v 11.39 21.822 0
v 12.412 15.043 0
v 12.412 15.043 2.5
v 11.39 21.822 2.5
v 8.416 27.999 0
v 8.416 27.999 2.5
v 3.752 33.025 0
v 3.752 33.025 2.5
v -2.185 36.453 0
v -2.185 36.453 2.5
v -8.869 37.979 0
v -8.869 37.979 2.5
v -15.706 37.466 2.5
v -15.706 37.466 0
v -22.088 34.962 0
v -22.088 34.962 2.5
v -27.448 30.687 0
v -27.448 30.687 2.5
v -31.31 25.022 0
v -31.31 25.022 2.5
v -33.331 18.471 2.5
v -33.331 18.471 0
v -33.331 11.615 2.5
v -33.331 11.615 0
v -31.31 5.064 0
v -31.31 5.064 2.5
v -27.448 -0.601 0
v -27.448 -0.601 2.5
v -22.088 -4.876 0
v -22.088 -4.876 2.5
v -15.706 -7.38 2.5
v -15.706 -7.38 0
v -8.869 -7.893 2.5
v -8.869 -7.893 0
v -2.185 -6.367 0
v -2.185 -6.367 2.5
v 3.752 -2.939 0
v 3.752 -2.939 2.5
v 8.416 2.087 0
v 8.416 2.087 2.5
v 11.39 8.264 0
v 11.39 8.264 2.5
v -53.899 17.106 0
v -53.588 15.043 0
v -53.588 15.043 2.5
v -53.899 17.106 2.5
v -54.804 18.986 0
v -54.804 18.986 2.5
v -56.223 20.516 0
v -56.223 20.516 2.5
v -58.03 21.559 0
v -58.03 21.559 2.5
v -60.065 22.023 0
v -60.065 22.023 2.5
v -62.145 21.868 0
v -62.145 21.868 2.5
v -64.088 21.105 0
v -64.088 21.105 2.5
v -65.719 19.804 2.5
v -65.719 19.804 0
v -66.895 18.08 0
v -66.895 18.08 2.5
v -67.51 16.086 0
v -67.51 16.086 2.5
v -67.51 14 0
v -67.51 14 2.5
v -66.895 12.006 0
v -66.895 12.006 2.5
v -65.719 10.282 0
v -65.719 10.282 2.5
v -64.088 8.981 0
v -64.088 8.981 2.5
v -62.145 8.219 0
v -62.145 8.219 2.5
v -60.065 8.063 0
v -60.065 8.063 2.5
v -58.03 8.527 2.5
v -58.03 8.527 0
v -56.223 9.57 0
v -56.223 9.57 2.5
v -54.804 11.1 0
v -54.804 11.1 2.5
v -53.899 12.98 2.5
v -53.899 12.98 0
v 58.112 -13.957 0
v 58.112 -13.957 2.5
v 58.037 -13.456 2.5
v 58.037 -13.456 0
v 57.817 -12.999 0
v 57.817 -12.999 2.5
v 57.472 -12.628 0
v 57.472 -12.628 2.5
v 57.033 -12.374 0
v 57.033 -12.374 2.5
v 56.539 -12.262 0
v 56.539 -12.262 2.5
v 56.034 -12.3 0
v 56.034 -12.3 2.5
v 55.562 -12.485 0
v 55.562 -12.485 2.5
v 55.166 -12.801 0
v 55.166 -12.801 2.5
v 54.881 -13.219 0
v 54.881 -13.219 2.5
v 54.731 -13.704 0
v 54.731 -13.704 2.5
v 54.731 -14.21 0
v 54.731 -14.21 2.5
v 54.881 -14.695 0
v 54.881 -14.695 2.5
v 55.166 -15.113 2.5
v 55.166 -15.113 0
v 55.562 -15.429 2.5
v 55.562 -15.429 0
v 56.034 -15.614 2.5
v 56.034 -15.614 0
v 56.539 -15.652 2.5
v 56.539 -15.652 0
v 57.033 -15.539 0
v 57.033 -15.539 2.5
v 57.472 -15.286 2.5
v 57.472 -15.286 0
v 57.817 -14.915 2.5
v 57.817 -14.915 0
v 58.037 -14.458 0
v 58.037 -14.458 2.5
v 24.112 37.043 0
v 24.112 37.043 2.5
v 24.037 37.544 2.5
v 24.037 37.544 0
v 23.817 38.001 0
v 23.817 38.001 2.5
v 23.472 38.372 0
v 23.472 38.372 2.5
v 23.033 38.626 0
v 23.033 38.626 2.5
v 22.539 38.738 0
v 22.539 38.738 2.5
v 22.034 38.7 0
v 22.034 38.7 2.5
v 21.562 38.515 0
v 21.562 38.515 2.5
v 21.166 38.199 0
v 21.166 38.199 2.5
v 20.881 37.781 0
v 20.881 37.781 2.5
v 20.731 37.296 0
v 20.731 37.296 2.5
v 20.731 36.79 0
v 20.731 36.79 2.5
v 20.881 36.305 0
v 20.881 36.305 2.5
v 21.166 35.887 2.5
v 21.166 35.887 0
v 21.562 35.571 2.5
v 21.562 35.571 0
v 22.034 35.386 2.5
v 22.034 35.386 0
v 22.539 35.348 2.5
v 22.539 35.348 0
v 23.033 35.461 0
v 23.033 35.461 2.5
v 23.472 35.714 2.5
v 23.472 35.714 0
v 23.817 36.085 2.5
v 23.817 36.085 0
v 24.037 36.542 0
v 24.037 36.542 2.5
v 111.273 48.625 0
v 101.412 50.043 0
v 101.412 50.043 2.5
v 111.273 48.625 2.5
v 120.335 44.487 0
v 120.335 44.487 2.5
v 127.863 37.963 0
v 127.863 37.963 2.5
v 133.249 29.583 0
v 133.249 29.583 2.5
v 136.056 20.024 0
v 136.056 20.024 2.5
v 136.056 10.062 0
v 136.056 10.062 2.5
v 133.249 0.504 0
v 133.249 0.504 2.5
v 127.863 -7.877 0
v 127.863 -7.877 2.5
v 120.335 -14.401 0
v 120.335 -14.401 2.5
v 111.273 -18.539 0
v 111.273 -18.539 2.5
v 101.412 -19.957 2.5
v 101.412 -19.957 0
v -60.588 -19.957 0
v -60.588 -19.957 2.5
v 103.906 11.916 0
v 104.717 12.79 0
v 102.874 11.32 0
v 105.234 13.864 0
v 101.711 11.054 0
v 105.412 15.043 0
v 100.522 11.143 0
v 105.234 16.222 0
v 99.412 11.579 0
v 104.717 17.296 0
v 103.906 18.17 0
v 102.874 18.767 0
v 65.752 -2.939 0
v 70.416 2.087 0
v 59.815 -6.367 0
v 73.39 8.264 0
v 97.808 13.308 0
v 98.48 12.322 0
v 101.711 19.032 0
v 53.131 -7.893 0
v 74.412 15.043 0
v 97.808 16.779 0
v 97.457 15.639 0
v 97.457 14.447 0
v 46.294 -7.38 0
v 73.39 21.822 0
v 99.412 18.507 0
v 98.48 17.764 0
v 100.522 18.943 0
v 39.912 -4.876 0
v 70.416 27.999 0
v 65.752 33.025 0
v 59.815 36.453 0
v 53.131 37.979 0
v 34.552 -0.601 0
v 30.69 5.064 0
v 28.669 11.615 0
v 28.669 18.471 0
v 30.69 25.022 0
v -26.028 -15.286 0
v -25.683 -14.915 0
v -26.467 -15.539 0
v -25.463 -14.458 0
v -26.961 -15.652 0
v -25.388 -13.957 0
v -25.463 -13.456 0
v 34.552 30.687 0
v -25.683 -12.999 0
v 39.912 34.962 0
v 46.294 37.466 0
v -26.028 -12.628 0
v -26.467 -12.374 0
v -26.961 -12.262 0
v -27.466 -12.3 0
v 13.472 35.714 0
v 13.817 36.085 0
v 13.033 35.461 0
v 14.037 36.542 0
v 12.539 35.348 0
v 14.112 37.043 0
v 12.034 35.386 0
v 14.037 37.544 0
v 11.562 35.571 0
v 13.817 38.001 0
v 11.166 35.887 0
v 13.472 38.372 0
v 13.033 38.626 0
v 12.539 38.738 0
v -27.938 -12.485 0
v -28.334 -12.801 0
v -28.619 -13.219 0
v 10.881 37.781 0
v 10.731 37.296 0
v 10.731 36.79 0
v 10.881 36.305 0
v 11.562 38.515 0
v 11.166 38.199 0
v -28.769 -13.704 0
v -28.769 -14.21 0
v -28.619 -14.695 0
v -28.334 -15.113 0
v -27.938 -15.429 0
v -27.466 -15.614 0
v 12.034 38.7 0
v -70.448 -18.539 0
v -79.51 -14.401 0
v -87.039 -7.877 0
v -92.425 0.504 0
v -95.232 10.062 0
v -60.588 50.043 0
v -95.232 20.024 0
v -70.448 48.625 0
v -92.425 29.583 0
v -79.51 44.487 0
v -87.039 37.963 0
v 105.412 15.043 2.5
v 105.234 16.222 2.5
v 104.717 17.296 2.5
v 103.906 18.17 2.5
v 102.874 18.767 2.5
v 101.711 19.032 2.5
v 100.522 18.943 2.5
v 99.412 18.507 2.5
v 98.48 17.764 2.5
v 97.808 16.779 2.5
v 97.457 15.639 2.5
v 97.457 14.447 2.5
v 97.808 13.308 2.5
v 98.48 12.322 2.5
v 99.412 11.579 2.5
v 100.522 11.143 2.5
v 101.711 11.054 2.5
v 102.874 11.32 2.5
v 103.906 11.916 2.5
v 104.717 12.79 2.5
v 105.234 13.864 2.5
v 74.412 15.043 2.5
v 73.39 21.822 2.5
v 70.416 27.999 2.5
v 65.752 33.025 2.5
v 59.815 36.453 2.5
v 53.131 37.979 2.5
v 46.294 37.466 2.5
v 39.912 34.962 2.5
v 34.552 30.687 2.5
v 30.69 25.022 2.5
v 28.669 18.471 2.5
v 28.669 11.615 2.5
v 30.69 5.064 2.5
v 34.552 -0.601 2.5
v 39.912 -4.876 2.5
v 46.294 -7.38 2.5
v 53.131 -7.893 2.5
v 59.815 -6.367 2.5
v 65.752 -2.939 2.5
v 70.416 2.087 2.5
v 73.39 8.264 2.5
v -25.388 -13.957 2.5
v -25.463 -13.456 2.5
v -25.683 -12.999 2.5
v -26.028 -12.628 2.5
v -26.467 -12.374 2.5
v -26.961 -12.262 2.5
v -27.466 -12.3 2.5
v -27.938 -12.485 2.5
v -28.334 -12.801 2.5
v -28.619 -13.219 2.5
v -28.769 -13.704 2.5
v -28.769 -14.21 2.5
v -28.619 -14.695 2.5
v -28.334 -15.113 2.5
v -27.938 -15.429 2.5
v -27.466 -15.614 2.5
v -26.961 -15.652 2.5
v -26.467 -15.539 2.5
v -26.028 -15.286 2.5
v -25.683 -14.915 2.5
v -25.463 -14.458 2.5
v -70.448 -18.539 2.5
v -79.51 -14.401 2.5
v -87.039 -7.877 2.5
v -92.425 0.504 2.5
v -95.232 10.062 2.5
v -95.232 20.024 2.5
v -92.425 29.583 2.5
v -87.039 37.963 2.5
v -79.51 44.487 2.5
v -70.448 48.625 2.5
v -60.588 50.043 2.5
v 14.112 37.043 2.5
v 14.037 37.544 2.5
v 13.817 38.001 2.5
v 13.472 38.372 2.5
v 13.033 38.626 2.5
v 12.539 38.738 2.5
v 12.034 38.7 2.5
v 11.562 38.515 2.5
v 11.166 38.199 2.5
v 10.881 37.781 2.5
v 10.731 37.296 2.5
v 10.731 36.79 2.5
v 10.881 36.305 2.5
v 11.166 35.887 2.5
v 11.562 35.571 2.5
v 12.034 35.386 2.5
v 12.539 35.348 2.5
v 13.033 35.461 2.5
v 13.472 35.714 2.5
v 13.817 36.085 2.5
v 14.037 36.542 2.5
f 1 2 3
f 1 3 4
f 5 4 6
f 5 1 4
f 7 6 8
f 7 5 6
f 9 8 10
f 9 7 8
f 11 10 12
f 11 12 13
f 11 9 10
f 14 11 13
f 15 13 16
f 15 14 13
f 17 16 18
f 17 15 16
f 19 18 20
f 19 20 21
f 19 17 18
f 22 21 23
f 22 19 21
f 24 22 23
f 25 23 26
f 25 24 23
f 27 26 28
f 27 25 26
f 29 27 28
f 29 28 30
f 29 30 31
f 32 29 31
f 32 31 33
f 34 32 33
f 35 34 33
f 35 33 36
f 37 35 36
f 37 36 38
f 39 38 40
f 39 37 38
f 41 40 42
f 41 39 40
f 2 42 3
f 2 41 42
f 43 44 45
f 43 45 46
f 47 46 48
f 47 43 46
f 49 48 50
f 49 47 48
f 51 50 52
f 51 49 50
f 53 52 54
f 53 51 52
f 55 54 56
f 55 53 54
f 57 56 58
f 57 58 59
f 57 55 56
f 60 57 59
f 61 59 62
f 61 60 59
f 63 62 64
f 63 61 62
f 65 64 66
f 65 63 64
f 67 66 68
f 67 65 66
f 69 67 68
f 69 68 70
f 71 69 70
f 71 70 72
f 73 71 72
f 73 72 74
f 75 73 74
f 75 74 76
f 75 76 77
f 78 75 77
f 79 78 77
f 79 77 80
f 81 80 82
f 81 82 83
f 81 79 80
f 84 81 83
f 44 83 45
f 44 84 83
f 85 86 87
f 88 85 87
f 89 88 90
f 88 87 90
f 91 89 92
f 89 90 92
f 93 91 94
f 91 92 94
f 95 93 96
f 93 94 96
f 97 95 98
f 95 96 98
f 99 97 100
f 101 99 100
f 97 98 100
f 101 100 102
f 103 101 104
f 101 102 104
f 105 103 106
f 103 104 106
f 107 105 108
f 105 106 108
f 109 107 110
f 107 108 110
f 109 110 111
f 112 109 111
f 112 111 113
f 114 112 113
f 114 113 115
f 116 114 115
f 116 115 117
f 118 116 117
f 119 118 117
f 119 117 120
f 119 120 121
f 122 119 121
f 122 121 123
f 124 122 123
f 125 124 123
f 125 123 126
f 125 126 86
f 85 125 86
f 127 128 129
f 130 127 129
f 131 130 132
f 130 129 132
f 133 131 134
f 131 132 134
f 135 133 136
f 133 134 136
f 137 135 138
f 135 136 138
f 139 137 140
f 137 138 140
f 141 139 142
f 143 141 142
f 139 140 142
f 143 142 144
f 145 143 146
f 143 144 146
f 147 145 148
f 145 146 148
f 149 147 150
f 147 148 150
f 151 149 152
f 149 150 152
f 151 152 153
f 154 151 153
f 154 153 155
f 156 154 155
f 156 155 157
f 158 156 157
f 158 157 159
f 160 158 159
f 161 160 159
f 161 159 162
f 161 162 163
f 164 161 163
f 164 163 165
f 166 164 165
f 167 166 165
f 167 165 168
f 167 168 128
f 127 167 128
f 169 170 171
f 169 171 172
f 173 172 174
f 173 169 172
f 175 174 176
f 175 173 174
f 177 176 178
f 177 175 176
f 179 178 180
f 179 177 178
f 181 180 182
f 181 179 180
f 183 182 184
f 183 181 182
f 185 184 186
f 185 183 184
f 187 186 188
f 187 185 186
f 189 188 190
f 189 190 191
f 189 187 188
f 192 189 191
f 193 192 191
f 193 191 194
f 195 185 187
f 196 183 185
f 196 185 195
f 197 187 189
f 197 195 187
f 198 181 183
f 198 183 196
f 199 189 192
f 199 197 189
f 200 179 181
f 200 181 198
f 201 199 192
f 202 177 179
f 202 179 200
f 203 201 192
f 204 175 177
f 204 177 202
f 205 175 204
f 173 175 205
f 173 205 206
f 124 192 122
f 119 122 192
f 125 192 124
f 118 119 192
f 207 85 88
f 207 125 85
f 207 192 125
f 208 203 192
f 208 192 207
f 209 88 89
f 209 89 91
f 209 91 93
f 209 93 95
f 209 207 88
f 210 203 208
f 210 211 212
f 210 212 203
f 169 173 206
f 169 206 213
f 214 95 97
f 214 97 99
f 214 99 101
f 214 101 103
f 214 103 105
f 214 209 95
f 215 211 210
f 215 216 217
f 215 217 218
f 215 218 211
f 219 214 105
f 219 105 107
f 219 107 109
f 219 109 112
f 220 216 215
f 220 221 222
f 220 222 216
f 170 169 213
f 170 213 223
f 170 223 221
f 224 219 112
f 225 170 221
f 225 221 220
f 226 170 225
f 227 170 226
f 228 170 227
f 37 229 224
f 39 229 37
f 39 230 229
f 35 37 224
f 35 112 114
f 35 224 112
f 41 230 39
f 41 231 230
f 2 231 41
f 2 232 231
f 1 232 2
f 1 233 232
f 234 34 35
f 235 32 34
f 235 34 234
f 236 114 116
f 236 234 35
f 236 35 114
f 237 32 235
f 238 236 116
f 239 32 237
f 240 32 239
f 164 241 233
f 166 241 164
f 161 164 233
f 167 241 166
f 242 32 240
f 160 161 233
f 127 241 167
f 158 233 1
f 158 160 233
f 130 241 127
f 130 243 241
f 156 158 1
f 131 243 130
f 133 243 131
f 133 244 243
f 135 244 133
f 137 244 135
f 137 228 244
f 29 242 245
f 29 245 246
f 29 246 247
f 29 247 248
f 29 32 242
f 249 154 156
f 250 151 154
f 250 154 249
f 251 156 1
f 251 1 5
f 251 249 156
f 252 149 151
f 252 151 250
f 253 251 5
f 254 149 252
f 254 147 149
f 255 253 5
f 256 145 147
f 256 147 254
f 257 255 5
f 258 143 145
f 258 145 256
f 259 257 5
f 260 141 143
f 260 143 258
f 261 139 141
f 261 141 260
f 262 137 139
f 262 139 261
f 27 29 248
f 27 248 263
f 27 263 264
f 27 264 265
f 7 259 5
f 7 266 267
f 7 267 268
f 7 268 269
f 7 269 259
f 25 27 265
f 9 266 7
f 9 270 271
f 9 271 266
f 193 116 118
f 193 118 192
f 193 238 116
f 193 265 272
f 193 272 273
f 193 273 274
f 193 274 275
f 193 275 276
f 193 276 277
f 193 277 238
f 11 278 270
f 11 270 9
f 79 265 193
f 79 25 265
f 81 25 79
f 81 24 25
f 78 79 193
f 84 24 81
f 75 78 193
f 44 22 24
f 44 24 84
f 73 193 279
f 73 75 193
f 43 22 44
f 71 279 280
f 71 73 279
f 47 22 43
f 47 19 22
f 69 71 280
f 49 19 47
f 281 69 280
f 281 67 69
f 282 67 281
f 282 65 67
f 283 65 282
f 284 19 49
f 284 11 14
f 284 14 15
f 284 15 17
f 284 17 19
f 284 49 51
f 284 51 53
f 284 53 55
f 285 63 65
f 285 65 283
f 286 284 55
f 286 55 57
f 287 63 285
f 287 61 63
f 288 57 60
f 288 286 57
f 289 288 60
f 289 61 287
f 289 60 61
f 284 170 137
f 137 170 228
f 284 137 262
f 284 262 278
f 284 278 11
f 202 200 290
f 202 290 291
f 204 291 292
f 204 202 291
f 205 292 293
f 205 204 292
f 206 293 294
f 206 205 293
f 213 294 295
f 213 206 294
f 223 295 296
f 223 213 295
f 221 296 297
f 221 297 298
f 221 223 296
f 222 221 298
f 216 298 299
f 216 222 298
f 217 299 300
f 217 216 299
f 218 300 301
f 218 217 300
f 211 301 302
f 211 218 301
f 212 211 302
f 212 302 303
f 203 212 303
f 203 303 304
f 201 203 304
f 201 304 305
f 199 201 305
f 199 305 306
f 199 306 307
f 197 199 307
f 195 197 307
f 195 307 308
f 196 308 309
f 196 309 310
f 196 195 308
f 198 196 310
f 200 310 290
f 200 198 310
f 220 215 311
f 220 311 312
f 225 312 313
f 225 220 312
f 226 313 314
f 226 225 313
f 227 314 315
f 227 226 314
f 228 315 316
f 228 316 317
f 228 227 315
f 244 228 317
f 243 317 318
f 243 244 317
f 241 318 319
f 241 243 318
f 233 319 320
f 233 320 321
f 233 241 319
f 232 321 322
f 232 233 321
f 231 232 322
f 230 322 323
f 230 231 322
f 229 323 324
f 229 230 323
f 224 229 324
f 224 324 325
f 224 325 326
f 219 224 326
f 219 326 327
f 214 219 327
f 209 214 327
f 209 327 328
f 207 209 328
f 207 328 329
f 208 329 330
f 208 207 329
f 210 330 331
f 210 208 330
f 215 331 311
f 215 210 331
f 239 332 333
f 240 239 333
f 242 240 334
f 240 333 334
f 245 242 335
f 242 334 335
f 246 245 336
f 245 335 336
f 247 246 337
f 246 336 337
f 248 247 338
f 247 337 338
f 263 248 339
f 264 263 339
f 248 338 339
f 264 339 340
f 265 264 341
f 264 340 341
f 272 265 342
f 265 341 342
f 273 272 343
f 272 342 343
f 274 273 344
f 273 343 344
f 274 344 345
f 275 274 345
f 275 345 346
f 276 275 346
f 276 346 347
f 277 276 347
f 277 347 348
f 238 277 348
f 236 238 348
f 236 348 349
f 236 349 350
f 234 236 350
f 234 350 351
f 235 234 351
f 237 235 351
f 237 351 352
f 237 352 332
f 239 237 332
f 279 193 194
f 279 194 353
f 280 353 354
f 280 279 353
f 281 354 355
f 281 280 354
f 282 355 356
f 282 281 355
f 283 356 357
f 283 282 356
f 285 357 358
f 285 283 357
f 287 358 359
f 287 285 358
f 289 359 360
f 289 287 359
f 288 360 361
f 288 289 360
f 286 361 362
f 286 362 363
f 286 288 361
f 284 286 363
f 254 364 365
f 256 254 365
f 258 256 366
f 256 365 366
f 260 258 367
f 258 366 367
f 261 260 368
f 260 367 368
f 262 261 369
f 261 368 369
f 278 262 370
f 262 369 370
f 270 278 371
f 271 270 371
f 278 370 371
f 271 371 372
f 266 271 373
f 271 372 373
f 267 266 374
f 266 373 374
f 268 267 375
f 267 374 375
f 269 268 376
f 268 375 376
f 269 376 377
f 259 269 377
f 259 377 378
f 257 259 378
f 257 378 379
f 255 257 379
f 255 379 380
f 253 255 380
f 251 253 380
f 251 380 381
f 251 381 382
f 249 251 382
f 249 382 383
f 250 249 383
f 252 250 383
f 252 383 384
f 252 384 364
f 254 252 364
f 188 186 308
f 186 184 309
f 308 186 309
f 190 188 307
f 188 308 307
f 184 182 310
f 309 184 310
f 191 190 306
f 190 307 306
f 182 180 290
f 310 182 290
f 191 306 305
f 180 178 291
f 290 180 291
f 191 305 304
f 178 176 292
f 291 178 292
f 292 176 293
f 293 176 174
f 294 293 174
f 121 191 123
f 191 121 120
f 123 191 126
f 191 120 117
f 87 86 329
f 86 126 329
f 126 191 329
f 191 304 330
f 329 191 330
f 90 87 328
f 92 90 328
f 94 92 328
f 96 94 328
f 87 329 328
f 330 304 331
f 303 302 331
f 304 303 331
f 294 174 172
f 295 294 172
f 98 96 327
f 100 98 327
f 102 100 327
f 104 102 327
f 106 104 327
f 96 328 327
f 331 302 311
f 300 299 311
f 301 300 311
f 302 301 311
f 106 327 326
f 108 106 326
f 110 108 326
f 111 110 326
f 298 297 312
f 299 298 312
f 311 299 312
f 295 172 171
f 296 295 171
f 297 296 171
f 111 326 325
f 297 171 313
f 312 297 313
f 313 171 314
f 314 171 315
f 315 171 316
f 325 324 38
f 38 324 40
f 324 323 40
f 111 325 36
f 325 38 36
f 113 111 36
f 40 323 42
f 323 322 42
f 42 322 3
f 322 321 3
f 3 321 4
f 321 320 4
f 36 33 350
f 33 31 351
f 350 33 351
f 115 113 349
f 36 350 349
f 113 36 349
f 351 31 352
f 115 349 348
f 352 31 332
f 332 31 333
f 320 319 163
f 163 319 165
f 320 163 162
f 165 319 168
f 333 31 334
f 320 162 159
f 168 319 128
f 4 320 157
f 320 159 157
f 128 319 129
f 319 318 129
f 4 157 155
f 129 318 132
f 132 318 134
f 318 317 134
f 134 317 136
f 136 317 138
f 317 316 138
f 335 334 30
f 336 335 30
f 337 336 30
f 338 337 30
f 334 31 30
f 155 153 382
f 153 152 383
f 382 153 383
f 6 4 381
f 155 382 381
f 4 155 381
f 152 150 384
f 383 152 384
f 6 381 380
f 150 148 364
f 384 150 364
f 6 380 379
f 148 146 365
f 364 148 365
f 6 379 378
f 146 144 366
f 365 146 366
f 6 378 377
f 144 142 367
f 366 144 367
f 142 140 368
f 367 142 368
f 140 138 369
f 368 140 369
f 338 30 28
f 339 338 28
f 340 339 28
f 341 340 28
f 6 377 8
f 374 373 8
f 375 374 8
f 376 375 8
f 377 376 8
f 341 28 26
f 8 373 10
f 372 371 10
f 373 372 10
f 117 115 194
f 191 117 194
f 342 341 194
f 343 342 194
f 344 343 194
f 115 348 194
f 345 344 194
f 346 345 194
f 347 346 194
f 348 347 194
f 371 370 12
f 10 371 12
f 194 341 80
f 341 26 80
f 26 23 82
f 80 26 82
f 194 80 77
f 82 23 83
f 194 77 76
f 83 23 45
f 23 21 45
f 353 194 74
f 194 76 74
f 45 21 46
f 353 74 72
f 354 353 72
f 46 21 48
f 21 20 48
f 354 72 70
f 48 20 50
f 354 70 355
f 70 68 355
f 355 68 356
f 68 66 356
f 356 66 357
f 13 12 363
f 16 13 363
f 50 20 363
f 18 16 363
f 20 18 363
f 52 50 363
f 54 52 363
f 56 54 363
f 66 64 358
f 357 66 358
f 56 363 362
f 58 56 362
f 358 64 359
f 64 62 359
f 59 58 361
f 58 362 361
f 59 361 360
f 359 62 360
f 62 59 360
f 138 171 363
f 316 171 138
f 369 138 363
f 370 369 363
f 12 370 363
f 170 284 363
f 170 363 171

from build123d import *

# Parameters (mm, degrees)
ESQUISSE2_R                = 7
ESQUISSE2_R_2              = 4
ESQUISSE2_R_3              = 23
BASE_EXTRUSION_DEPTH       = 2.5
ESQUISSE9_R                = 1.7
ENL_V_MAT_EXTRU_2_DEPTH    = 146.323213238
R_P_TITION_LIN_AIRE1_COUNT = 2
R_P_TITION_LIN_AIRE1_PITCH = 10
ESQUISSE10_R               = 1.7
ENL_V_MAT_EXTRU_3_DEPTH    = 146.323213238
R_P_TITION_LIN_AIRE2_COUNT = 2
R_P_TITION_LIN_AIRE2_PITCH = 83.5


with BuildPart() as part:
    # Esquisse2 → Base-Extrusion (new body)
    with BuildSketch(Plane.XY):
        with BuildLine():
            Line((-60.587831126, 50.043046358), (101.412168874, 50.043046358))
            ThreePointArc((101.412168874, 50.043046358), (136.412168874, 15.043046358), (101.412168874, -19.956953642))
            Line((101.412168874, -19.956953642), (-60.587831126, -19.956953642))
            ThreePointArc((-60.587831126, -19.956953642), (-95.587831126, 15.043046358), (-60.587831126, 50.043046358))
        make_face()
        with Locations((-60.587831126, 15.043046358)):
            Circle(ESQUISSE2_R, mode=Mode.SUBTRACT)
        with Locations((101.412168874, 15.043046358)):
            Circle(ESQUISSE2_R_2, mode=Mode.SUBTRACT)
        with Locations((51.412168874, 15.043046358)):
            Circle(ESQUISSE2_R_3, mode=Mode.SUBTRACT)
        with Locations((-10.587831126, 15.043046358)):
            Circle(ESQUISSE2_R_3, mode=Mode.SUBTRACT)
    extrude(amount=BASE_EXTRUSION_DEPTH)

    # Esquisse9 → Enlèv. mat.-Extru.2 (cut, through all)
    with BuildSketch(Plane.XY.offset(2.5)):
        with Locations((12.412168874, 37.043046358)):
            Circle(ESQUISSE9_R)
    enl_v_mat_extru_2 = extrude(amount=-ENL_V_MAT_EXTRU_2_DEPTH, mode=Mode.SUBTRACT)

    # Répétition linéaire1: Enlèv. mat.-Extru.2 ×2
    with Locations(*[(i * R_P_TITION_LIN_AIRE1_PITCH, 0, 0) for i in range(1, R_P_TITION_LIN_AIRE1_COUNT)]):
        add(enl_v_mat_extru_2, mode=Mode.SUBTRACT)

    # Esquisse10 → Enlèv. mat.-Extru.3 (cut, through all)
    with BuildSketch(Plane.XY.offset(2.5)):
        with Locations((-27.087831126, -13.956953642)):
            Circle(ESQUISSE10_R)
    enl_v_mat_extru_3 = extrude(amount=-ENL_V_MAT_EXTRU_3_DEPTH, mode=Mode.SUBTRACT)

    # Répétition linéaire2: Enlèv. mat.-Extru.3 ×2
    with Locations(*[(i * R_P_TITION_LIN_AIRE2_PITCH, 0, 0) for i in range(1, R_P_TITION_LIN_AIRE2_COUNT)]):
        add(enl_v_mat_extru_3, mode=Mode.SUBTRACT)


solid = part.part
